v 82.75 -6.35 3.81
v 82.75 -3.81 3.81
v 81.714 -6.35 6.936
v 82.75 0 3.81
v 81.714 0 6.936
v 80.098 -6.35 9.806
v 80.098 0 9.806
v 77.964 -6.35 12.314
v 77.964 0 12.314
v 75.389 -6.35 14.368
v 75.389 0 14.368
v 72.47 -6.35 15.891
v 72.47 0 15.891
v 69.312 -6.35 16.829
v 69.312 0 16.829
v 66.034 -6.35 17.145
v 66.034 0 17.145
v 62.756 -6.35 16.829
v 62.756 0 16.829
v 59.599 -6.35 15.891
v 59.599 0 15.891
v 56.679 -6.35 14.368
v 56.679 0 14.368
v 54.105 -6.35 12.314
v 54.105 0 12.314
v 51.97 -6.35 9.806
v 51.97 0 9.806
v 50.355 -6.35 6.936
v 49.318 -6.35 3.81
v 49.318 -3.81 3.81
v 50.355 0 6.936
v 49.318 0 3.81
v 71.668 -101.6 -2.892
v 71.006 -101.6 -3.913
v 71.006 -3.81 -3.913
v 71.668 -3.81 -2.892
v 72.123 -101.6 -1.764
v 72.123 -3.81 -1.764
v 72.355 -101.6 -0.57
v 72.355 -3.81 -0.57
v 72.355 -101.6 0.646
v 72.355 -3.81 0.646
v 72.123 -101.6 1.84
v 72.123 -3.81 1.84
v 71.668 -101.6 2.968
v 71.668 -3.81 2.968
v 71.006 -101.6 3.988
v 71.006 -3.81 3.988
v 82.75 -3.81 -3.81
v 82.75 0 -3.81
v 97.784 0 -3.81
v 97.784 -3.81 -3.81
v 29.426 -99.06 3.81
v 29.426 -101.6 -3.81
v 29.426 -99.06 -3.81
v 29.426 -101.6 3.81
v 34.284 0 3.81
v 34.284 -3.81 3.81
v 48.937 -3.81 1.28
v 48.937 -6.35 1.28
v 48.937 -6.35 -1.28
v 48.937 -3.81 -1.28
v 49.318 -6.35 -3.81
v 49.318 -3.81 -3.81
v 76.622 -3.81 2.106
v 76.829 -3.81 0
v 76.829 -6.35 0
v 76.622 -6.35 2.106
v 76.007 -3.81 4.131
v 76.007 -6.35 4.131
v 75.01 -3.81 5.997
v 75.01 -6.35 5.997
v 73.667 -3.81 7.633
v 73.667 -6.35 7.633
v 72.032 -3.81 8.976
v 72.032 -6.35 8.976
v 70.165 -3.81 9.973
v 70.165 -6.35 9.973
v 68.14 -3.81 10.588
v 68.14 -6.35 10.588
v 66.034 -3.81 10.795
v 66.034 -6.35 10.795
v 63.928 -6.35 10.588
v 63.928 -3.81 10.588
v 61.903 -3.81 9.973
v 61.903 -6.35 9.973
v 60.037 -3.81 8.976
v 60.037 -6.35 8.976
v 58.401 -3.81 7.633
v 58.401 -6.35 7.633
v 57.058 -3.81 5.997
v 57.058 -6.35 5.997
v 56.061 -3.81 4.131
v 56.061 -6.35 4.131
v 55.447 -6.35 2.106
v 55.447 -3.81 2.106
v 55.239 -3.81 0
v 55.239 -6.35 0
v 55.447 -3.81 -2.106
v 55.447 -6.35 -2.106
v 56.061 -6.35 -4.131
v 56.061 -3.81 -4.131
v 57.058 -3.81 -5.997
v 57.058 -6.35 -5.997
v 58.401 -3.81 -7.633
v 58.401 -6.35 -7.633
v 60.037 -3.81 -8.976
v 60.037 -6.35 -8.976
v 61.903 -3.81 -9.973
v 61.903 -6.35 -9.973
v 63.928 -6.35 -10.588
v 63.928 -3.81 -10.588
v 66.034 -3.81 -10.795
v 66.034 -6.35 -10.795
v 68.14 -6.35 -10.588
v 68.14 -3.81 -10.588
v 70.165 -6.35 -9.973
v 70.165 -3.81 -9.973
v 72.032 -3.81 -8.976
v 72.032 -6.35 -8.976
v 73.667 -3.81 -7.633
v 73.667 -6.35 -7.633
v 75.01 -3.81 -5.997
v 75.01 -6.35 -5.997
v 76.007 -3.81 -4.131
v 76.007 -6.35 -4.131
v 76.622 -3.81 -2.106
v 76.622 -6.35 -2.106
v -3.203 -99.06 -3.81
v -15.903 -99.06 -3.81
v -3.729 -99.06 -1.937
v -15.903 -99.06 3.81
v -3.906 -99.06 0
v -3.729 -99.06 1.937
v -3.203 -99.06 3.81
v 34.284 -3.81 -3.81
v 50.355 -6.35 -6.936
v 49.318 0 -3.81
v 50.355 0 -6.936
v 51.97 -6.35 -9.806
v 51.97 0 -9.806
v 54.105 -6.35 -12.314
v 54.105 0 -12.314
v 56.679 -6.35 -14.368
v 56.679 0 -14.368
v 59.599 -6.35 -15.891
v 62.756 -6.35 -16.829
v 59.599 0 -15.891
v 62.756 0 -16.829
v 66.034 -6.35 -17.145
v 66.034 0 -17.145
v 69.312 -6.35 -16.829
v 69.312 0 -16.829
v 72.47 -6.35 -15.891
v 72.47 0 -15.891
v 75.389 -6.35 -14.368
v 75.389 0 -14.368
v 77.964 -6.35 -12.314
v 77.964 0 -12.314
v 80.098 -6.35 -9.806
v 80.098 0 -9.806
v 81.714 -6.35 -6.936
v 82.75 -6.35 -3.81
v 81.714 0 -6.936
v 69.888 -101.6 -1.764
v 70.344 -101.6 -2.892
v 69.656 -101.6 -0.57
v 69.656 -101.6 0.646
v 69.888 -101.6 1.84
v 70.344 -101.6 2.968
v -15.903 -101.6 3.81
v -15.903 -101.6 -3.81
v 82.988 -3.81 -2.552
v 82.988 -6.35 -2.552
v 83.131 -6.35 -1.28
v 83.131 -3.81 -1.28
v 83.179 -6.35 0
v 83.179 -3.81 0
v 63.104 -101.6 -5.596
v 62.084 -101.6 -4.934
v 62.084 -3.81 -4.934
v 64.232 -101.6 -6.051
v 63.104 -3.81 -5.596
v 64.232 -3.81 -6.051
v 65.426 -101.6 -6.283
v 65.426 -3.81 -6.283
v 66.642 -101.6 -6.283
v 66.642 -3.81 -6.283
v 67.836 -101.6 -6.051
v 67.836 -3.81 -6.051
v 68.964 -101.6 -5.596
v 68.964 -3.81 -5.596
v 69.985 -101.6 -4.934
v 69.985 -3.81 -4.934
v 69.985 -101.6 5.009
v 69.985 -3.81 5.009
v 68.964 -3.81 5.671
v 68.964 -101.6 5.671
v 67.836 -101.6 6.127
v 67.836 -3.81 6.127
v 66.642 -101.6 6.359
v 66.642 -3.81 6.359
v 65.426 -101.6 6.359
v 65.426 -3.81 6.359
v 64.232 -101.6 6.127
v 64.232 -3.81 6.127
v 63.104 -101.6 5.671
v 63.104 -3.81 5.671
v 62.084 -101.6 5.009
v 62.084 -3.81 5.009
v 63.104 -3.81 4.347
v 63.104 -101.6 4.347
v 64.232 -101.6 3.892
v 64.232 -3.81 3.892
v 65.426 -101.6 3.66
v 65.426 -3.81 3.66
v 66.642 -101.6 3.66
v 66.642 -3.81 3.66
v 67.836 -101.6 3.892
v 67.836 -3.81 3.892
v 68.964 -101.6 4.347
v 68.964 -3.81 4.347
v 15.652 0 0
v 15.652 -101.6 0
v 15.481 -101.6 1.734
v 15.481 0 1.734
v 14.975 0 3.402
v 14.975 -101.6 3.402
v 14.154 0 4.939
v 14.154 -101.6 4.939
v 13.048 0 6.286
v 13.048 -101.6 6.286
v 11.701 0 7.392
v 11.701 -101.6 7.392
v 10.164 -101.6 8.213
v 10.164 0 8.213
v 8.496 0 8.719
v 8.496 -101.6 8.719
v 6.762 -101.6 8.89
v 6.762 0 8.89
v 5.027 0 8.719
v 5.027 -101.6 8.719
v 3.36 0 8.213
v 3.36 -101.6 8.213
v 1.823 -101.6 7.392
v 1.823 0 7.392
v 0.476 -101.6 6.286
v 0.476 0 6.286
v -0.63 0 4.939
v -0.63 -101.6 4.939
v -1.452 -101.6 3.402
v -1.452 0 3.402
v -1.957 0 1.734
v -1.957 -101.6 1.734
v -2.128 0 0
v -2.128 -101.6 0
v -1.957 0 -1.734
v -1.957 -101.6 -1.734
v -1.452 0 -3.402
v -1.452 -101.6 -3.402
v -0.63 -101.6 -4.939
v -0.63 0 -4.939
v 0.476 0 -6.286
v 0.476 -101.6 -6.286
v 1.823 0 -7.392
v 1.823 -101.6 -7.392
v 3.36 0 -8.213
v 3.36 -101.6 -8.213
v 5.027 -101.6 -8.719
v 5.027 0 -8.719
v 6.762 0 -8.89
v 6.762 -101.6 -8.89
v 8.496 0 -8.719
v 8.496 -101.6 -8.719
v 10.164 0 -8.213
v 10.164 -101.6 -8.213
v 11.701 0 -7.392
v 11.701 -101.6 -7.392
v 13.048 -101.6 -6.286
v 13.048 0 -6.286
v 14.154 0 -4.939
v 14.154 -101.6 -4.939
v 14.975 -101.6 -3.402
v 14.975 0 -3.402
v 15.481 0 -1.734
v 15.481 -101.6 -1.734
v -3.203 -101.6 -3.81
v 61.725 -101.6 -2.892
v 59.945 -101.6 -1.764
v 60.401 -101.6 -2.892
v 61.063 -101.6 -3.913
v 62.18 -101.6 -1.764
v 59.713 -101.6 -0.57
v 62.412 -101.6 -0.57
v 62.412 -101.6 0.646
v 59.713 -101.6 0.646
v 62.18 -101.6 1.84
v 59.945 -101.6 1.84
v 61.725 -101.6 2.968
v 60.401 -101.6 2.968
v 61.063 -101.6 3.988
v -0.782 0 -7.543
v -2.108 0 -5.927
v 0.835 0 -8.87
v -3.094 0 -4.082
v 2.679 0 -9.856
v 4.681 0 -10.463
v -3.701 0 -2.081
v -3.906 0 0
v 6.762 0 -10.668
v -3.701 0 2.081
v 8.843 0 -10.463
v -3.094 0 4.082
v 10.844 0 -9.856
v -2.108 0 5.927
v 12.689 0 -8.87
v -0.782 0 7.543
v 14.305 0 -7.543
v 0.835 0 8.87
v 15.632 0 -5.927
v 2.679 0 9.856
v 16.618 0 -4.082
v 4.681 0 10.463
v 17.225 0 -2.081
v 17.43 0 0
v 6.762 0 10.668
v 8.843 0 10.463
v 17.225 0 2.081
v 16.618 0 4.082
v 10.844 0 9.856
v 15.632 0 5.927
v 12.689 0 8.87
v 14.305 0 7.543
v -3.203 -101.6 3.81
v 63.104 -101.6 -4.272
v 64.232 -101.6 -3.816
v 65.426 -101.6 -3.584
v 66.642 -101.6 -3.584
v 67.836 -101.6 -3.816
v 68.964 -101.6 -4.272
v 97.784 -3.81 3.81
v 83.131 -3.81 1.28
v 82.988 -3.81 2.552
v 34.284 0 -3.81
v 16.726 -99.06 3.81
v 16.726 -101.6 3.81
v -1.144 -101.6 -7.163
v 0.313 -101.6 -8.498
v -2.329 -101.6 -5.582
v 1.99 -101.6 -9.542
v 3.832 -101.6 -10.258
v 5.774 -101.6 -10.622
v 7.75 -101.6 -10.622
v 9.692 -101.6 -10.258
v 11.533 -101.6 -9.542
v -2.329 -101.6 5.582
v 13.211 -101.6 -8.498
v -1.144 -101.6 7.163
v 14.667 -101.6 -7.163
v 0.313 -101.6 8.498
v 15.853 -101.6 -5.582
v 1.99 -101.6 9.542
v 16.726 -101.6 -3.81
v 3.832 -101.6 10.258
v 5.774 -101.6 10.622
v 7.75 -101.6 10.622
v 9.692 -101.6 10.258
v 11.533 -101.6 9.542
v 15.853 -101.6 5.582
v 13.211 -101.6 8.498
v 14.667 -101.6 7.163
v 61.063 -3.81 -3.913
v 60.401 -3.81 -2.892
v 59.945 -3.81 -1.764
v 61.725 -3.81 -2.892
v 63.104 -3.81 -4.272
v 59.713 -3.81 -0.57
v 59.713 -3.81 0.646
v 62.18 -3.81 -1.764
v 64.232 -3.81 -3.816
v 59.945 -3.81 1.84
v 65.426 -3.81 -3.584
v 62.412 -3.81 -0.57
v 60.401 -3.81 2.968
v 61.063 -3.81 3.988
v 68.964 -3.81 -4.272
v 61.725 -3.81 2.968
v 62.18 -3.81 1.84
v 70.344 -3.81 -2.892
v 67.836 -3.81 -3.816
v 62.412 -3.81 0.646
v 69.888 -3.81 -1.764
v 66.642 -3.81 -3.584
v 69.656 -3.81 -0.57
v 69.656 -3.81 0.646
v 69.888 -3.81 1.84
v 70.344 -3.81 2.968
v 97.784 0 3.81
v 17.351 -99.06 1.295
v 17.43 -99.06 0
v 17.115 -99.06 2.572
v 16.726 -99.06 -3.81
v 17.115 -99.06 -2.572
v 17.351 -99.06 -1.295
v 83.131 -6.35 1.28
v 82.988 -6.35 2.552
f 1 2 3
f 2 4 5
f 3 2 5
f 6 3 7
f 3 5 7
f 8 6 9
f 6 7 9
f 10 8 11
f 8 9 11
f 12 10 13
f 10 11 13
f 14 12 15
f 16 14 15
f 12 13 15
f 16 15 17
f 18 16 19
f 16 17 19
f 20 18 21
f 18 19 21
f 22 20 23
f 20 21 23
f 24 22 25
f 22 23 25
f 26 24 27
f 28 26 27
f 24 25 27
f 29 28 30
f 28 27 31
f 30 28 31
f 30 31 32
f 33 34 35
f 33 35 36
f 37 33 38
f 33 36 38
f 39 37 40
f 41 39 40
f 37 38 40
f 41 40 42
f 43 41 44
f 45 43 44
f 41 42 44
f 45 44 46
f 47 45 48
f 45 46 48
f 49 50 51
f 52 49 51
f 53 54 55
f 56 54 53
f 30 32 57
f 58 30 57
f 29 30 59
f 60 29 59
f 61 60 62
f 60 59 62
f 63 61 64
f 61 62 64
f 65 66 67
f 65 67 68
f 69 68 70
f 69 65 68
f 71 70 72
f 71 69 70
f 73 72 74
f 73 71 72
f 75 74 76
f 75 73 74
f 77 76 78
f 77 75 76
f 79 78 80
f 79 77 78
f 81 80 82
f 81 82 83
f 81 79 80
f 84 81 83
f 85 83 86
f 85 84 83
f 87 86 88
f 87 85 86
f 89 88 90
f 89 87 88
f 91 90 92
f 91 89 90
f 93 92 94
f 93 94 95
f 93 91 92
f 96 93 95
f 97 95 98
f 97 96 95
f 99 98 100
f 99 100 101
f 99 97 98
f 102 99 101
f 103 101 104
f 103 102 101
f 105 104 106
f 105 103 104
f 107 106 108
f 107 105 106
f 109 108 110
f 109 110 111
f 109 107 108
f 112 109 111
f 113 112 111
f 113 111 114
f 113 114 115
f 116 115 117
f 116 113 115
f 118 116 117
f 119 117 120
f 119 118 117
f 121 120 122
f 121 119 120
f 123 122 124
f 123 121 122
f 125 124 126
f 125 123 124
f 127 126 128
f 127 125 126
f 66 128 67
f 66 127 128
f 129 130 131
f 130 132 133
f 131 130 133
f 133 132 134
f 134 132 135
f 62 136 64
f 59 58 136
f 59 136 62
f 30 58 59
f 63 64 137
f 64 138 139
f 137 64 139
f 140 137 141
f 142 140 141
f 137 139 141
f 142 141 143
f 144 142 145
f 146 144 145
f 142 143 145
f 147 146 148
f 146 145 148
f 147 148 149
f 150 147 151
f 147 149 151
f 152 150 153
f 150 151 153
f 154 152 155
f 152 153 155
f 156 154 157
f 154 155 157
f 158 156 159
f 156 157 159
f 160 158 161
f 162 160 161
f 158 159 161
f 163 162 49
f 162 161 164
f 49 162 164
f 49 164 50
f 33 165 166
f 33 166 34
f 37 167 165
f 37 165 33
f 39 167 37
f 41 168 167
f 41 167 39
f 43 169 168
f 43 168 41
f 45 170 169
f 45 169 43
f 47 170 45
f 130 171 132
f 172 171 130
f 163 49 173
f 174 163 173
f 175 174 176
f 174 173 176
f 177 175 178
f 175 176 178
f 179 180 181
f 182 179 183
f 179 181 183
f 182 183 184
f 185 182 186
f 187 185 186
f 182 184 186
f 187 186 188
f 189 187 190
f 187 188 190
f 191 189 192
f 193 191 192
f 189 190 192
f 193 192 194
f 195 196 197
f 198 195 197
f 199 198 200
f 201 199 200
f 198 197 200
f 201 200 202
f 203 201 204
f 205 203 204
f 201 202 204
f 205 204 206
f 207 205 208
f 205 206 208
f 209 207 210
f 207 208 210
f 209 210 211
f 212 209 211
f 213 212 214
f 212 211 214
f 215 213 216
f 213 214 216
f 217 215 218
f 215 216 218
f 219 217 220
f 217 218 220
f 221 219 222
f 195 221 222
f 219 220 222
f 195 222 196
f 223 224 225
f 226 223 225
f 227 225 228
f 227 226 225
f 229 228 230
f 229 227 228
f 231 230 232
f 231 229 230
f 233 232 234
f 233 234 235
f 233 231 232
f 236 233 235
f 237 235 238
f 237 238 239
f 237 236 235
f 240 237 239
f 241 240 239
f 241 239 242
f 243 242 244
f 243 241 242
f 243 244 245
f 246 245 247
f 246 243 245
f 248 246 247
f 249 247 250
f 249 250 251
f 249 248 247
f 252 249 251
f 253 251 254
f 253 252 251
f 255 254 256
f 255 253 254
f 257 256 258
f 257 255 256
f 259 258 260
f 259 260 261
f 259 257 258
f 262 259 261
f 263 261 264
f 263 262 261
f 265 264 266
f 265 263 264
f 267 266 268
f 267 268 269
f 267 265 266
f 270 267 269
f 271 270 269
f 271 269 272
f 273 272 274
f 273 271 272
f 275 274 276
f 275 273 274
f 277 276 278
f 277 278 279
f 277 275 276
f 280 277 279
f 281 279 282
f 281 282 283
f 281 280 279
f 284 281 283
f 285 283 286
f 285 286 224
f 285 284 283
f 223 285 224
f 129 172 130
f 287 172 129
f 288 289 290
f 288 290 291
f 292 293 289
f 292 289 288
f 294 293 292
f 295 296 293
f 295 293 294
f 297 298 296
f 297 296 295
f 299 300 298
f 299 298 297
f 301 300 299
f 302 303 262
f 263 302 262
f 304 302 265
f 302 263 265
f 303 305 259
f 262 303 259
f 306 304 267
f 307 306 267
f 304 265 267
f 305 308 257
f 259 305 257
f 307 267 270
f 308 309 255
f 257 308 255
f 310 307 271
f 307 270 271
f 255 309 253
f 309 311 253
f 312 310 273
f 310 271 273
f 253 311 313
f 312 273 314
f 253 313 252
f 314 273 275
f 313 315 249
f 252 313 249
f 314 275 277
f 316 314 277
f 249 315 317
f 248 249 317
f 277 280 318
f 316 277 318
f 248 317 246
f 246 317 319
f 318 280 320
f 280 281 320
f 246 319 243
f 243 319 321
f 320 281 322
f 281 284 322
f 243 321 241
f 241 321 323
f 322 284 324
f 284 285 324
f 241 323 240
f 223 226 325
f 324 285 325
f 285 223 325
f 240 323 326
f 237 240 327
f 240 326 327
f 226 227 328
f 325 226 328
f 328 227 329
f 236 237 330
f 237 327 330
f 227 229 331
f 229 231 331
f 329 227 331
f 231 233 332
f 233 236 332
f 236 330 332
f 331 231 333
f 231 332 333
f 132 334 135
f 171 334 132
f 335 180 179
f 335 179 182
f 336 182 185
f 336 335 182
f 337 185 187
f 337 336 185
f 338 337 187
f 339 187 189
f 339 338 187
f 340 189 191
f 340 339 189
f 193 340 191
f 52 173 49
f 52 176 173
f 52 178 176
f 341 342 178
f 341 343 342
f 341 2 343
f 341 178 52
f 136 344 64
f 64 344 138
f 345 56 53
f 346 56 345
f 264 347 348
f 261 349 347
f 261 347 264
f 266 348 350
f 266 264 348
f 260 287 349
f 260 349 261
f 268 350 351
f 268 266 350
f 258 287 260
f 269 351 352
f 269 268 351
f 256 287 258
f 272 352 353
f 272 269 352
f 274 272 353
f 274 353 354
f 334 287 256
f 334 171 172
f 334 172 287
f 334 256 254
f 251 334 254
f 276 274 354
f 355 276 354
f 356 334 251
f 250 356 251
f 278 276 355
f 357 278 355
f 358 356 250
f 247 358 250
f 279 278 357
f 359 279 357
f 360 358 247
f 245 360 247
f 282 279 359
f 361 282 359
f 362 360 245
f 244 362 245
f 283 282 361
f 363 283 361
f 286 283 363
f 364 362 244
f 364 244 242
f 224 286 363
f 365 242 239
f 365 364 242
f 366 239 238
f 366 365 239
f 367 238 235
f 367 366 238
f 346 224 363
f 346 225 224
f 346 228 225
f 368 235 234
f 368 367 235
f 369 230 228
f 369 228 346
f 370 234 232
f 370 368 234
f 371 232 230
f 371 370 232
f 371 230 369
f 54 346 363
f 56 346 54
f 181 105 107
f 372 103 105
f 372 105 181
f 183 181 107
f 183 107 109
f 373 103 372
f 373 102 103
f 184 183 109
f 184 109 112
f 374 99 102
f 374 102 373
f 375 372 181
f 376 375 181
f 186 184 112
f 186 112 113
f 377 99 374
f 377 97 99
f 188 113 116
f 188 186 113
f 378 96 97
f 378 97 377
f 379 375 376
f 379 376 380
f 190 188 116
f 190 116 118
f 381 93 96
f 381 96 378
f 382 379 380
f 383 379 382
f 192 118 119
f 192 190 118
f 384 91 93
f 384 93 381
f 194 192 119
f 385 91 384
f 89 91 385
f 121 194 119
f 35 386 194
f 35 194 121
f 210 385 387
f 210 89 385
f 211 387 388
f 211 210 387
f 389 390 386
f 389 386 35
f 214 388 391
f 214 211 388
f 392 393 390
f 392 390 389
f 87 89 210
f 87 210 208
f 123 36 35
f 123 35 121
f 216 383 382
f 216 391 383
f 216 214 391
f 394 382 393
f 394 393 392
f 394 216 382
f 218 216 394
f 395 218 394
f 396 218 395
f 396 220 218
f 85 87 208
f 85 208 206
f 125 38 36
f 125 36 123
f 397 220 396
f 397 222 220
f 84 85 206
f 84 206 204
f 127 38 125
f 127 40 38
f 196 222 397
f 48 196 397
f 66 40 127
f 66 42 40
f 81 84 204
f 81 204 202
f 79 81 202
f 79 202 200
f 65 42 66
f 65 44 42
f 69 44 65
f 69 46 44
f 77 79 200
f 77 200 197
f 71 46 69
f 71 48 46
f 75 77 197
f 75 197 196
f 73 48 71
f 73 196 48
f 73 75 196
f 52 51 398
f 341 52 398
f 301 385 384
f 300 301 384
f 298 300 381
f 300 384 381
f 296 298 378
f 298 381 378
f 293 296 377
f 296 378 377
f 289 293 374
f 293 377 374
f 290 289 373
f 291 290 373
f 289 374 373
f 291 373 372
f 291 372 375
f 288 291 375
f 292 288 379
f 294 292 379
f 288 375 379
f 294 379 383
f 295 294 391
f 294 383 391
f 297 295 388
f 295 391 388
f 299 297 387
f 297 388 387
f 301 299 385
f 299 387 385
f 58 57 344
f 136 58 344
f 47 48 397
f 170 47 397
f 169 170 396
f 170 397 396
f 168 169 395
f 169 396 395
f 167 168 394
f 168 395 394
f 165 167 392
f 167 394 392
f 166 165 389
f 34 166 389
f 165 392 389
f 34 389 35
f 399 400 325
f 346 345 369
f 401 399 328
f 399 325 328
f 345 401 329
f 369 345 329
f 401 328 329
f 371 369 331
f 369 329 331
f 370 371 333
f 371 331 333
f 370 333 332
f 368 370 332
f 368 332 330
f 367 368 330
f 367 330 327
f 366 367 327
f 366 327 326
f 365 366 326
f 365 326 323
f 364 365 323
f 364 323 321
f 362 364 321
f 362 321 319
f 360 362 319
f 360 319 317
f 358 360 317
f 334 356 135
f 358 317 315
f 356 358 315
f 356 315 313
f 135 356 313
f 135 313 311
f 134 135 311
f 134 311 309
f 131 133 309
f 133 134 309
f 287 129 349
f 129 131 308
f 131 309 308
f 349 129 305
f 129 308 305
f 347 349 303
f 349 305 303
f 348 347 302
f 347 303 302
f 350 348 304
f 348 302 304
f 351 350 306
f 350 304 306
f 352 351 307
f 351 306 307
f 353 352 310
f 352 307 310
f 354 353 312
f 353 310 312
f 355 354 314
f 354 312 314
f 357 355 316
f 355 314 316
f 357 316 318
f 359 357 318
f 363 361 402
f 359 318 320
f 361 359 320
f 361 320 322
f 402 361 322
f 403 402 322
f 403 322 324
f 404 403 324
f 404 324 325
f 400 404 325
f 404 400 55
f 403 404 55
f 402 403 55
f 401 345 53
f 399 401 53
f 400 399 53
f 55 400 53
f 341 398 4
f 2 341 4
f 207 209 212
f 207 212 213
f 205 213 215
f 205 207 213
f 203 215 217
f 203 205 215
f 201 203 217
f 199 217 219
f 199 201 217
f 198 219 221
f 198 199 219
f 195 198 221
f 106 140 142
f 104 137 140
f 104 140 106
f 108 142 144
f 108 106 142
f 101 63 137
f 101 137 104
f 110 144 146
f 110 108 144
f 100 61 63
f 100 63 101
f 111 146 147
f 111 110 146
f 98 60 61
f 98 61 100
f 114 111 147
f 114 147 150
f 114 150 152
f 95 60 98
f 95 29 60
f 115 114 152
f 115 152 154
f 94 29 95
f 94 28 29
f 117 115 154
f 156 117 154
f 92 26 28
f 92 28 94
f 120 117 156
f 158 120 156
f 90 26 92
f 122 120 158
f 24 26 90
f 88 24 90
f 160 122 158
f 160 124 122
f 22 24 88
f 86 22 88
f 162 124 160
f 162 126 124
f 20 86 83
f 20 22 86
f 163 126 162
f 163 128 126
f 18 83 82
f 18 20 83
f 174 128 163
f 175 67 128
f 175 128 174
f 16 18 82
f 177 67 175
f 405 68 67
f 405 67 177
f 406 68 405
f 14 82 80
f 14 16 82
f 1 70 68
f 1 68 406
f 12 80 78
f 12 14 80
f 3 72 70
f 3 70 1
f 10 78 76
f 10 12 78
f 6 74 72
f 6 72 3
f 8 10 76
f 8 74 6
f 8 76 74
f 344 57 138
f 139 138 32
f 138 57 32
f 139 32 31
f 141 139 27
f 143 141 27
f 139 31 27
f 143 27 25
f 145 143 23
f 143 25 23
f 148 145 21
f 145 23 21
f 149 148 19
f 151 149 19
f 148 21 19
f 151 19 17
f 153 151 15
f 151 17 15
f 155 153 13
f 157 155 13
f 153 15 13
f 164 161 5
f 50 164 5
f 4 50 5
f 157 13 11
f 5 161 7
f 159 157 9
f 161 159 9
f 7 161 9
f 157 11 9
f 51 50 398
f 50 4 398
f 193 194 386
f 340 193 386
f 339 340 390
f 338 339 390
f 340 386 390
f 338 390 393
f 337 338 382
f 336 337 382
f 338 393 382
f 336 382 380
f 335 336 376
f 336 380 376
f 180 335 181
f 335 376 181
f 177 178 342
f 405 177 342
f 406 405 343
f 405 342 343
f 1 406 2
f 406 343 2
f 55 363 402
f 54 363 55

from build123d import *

# Parameters (mm, degrees)
F0_R      = 15.875
F1_DEPTH  = 3.81
F2_R      = 10.795
F3_DEPTH  = 2.54
F4_R      = 10.668
F4_R_2    = 8.89
F5_DEPTH  = 101.6
F8_DEPTH  = 2.54
F11_DEPTH = 97.79


# Not quite as in the source:
# - a feature names something its author has since deleted; it is built from what else it names


with BuildPart() as f1:
    # F0 (on Front) → F1 (new body)
    with BuildSketch(Plane.XZ):
        with BuildLine():
            Line((34.2841744423, 3.81), (34.2841744423, 0))
            Line((34.2841744423, 0), (34.2841744423, -3.81))
            Line((34.2841744423, -3.81), (49.3178672843, -3.81))
            ThreePointArc((49.3178672843, -3.81), (48.8891744423, 0), (49.3178672843, 3.81))
            Line((49.3178672843, 3.81), (34.2841744423, 3.81))
        make_face()
        with BuildLine():
            Line((97.7841744423, 3.81), (82.7504816003, 3.81))
            ThreePointArc((82.7504816003, 3.81), (83.0716641521, 1.9170209671), (83.1791744423, 0))
            ThreePointArc((83.1791744423, 0), (83.0716641521, -1.9170209671), (82.7504816003, -3.81))
            Line((82.7504816003, -3.81), (97.7841744423, -3.81))
            Line((97.7841744423, -3.81), (97.7841744423, 0))
            Line((97.7841744423, 0), (97.7841744423, 3.81))
        make_face()
        with BuildLine():
            ThreePointArc((82.7504816003, 3.81), (66.0341744423, 17.145), (49.3178672843, 3.81))
            ThreePointArc((49.3178672843, 3.81), (48.8891744423, 0), (49.3178672843, -3.81))
            ThreePointArc((49.3178672843, -3.81), (66.0341744423, -17.145), (82.7504816003, -3.81))
            ThreePointArc((82.7504816003, -3.81), (83.0716641521, -1.9170209671), (83.1791744423, 0))
            ThreePointArc((83.1791744423, 0), (83.0716641521, 1.9170209671), (82.7504816003, 3.81))
        make_face()
        with Locations((66.0341744423, 0)):
            Circle(F0_R, mode=Mode.SUBTRACT)
        with Locations((66.0341744423, 0)):
            Circle(F0_R)
    extrude(amount=F1_DEPTH)

    # F2 (on face) → F3 (join)
    with BuildSketch(Plane.XZ.offset(3.81)):
        with BuildLine():
            ThreePointArc((82.7504816003, 3.81), (66.0341744423, 17.145), (49.3178672843, 3.81))
            ThreePointArc((49.3178672843, 3.81), (48.8891744423, 0), (49.3178672843, -3.81))
            ThreePointArc((49.3178672843, -3.81), (66.0341744423, -17.145), (82.7504816003, -3.81))
            ThreePointArc((82.7504816003, -3.81), (83.0716641521, -1.9170209671), (83.1791744423, 0))
            ThreePointArc((83.1791744423, 0), (83.0716641521, 1.9170209671), (82.7504816003, 3.81))
        make_face()
        with Locations((66.0341744423, 0)):
            Circle(F2_R, mode=Mode.SUBTRACT)
    extrude(amount=F3_DEPTH)

    # F10 (on face) → F11 (join)
    with BuildSketch(Plane.XZ.offset(3.81)):
        with BuildLine():
            ThreePointArc((61.0627080612, -3.9127058819), (62.4412416802, 0.0378664845), (61.0627080612, 3.9884388509))
            ThreePointArc((61.0627080612, 3.9884388509), (59.6841744423, 0.0378664845), (61.0627080612, -3.9127058819))
        make_face()
        with BuildLine():
            ThreePointArc((62.0836020759, 5.0093328655), (66.0341744423, 3.6307992466), (69.9847468087, 5.0093328655))
            ThreePointArc((69.9847468087, 5.0093328655), (66.0341744423, 6.3878664845), (62.0836020759, 5.0093328655))
        make_face()
        with BuildLine():
            ThreePointArc((69.9847468087, -4.9335998966), (66.0341744423, -3.5550662776), (62.0836020759, -4.9335998966))
            ThreePointArc((62.0836020759, -4.9335998966), (66.0341744423, -6.3121335155), (69.9847468087, -4.9335998966))
        make_face()
        with BuildLine():
            ThreePointArc((71.0056408233, 3.9884388509), (69.6271072044, 0.0378664845), (71.0056408233, -3.9127058819))
            ThreePointArc((71.0056408233, -3.9127058819), (72.3841744423, 0.0378664845), (71.0056408233, 3.9884388509))
        make_face()
    extrude(amount=F11_DEPTH)


with BuildPart() as f5:
    # F4 (on Front) → F5 (new body)
    with BuildSketch(Plane.XZ):
        with Locations((6.7617367022, 0)):
            Circle(F4_R)
        with Locations((6.7617367022, 0)):
            Circle(F4_R_2, mode=Mode.SUBTRACT)
    extrude(amount=F5_DEPTH)

    # F7 (on face) → F8 (join)
    with BuildSketch(Plane.XZ.offset(101.6)):
        with BuildLine():
            ThreePointArc((-3.2027062828, -3.81), (-3.9062632978, 0), (-3.2027062828, 3.81))
            Line((-3.2027062828, 3.81), (-15.9027062828, 3.81))
            Line((-15.9027062828, 3.81), (-15.9027062828, -3.81))
            Line((-15.9027062828, -3.81), (-3.2027062828, -3.81))
        make_face()
        with BuildLine():
            Line((29.4261796871, 3.81), (16.7261796871, 3.81))
            ThreePointArc((16.7261796871, 3.81), (17.2523730452, 1.9372075569), (17.4297367022, 0))
            ThreePointArc((17.4297367022, 0), (17.2523730452, -1.9372075569), (16.7261796871, -3.81))
            Line((16.7261796871, -3.81), (29.4261796871, -3.81))
            Line((29.4261796871, -3.81), (29.4261796871, 3.81))
        make_face()
    extrude(amount=-F8_DEPTH)


solid = Compound([f1.part, f5.part])
